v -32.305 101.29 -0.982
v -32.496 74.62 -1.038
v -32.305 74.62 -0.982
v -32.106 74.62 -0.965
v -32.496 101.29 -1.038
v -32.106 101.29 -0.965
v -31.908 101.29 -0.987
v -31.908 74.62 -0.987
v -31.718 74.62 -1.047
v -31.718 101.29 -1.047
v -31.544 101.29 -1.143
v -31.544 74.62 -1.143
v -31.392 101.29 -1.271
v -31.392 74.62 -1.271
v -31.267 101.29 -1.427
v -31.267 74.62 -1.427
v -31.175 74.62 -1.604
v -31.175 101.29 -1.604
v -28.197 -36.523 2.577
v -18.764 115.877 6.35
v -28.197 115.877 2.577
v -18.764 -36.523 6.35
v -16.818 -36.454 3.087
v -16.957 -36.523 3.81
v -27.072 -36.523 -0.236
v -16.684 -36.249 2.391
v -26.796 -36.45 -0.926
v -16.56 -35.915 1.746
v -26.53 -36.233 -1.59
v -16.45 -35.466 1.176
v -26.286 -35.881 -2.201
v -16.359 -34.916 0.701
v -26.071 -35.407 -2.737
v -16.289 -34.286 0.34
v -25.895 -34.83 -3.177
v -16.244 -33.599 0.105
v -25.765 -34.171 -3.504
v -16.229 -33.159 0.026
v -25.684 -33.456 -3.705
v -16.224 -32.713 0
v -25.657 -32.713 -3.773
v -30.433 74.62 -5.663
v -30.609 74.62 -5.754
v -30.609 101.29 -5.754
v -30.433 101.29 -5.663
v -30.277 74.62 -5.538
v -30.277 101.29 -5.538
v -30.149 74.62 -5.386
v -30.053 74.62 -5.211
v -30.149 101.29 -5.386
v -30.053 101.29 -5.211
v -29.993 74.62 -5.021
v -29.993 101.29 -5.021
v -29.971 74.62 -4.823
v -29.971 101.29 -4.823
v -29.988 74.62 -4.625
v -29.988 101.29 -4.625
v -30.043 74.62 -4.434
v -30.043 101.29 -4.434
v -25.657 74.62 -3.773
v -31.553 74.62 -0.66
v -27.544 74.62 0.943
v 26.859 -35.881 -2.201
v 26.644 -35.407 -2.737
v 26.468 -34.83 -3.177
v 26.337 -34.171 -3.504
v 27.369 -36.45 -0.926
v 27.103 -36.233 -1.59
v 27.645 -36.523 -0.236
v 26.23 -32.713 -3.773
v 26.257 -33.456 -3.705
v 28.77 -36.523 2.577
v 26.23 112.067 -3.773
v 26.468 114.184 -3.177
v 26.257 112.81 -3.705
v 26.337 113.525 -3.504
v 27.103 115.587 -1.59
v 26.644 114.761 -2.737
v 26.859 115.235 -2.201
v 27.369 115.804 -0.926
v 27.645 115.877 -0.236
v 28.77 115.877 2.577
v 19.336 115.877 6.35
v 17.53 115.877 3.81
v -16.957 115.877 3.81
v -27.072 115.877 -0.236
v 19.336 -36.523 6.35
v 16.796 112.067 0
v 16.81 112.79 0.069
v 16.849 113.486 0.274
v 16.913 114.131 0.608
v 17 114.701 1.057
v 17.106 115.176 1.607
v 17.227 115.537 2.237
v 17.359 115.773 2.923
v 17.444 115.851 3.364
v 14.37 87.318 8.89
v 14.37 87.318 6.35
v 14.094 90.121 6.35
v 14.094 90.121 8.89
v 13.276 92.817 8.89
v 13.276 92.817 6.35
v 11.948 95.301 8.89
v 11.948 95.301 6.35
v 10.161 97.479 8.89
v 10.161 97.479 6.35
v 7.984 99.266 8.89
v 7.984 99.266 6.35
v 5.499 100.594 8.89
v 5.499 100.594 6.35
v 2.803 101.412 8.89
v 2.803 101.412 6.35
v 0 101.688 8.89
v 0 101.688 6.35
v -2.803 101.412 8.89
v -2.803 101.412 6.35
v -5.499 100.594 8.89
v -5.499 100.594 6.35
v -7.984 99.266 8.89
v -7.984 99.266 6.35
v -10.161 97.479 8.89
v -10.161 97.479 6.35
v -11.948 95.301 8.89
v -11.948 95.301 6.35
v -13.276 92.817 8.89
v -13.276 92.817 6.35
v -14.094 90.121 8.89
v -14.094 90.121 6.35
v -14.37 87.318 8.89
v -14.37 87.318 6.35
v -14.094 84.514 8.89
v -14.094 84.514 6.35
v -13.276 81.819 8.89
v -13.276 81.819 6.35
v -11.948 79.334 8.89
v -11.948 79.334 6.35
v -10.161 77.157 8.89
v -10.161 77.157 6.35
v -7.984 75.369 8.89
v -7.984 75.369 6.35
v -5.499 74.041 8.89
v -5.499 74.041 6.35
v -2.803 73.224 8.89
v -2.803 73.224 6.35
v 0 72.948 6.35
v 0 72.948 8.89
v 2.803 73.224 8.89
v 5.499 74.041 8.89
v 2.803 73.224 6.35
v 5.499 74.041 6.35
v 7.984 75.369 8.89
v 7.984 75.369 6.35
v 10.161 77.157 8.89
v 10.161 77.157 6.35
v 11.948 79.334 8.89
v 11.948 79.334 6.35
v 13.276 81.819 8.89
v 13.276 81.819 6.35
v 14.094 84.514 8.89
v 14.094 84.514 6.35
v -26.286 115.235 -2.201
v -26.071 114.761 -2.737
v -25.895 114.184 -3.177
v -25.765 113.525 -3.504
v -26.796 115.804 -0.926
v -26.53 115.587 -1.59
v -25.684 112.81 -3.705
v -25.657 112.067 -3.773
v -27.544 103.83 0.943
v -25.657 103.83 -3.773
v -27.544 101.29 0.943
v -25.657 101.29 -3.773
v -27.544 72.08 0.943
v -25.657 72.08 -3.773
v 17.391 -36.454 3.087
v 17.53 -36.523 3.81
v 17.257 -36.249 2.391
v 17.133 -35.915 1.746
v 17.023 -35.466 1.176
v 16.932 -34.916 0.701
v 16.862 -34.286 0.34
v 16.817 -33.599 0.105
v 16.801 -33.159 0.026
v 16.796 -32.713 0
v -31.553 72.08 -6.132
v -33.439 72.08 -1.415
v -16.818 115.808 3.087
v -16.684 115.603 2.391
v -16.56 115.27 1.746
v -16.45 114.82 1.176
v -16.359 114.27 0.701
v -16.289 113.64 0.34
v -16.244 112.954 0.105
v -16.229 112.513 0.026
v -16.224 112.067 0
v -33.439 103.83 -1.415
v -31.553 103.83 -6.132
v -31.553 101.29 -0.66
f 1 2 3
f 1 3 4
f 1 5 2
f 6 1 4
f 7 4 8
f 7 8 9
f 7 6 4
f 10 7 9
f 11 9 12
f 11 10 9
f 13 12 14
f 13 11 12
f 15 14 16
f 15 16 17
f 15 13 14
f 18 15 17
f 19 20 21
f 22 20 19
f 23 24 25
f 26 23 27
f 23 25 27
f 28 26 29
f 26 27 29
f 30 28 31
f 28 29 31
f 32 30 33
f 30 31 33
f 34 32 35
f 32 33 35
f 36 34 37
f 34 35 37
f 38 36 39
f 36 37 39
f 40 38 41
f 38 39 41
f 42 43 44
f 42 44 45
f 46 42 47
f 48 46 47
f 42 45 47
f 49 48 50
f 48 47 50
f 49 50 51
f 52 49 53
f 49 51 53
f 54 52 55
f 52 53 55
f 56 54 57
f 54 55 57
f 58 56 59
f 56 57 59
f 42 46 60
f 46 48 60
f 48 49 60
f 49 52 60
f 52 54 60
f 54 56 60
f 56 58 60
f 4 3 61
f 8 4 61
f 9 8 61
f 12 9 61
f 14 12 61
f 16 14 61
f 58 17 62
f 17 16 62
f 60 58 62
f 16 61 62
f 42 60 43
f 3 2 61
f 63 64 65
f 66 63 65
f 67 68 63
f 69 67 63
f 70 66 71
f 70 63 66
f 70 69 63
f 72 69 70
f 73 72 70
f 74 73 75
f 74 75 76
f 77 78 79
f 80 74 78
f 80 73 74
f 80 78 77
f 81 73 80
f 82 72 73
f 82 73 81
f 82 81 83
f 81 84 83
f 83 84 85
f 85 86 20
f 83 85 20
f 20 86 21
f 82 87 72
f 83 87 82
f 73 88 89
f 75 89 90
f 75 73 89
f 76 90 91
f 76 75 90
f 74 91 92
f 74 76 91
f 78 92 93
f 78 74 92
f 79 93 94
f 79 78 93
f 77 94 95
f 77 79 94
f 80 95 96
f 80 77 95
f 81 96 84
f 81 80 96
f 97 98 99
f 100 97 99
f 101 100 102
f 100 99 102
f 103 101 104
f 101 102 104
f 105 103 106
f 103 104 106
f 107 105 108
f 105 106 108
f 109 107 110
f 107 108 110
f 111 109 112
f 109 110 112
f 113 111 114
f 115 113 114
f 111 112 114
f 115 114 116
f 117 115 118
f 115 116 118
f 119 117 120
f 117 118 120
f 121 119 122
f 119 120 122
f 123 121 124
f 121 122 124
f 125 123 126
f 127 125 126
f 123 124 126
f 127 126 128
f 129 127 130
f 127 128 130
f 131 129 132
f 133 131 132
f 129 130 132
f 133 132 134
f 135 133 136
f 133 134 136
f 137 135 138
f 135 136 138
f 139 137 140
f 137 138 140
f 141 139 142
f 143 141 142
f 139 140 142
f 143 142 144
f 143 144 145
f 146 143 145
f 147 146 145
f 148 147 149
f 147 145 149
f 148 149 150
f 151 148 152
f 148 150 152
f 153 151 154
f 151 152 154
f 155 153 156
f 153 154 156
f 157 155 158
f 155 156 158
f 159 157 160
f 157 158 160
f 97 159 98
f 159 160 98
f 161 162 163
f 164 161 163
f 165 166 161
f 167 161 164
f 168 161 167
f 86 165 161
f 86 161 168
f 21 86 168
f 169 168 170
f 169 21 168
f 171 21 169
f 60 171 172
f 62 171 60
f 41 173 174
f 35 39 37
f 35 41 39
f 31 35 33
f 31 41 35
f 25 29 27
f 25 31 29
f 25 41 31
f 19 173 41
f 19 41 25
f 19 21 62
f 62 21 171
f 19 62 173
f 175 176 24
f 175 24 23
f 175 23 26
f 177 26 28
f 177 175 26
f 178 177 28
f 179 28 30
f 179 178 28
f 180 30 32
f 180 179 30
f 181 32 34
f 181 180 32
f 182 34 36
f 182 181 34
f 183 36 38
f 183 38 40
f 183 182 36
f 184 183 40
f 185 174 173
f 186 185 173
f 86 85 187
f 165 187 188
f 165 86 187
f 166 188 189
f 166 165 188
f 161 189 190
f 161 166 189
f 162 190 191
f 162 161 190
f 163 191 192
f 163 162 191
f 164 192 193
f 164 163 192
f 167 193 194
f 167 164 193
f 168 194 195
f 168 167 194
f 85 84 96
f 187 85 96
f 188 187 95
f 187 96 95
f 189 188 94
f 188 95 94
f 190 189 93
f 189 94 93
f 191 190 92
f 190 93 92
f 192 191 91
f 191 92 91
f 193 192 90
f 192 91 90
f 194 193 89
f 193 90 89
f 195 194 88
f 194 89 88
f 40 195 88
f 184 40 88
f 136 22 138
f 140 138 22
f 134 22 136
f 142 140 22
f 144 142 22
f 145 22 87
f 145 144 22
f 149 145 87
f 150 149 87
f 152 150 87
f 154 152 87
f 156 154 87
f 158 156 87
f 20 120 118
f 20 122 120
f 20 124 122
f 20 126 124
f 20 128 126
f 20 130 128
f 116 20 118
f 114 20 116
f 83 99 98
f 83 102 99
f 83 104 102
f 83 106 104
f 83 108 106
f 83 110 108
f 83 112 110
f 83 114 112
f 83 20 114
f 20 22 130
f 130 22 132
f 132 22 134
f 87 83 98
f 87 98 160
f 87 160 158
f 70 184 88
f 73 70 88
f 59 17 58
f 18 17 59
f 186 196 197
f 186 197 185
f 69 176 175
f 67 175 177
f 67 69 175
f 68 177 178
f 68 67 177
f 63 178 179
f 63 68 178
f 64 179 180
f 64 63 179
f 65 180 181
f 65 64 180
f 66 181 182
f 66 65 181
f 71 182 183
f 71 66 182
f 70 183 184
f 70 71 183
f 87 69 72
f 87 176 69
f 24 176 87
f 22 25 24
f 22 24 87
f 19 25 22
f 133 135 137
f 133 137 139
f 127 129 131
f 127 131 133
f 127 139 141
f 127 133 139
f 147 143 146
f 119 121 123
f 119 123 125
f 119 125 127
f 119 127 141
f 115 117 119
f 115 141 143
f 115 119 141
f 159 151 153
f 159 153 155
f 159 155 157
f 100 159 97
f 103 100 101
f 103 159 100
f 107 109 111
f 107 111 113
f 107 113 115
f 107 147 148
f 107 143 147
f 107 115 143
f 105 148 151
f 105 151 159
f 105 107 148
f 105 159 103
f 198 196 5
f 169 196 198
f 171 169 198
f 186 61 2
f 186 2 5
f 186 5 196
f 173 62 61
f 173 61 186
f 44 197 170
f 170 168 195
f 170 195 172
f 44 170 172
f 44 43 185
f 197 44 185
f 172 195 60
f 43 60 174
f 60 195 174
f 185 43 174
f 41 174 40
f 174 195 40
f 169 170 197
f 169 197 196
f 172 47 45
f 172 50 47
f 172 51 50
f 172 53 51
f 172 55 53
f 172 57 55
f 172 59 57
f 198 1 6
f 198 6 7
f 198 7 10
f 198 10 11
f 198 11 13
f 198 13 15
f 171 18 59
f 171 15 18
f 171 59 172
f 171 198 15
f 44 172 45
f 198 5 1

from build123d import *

# Parameters (mm, degrees)
F0_W       = 38.1
F0_H       = 152.4
F1_DEPTH   = 6.35
F2_SIZE2   = 2.53999
F2_SIZE    = 6.34999
F2_2_SIZE2 = 2.53999
F2_2_SIZE  = 6.34999
F3_W       = 152.4
F3_H       = 6.8391593051
F4_DEPTH   = 10.16
F5_W       = 152.4
F5_H       = 6.8391593051
F6_DEPTH   = 10.16
F7_R       = 3.81
F8_W       = 31.75
F8_H       = 5.08
F9_DEPTH   = 6.35
F10_W      = 4.318
F10_H      = 26.67
F11_DEPTH  = 25.4
F12_R      = 1.016
F13_R      = 14.3701538506
F14_DEPTH  = 2.54


# Not quite as in the source:
# - a fillet or chamfer is up to 0.001 mm smaller than in the source, because OpenCascade refuses the exact size


with BuildPart() as f1:
    # F0 (on Top) → F1 (new body)
    with BuildSketch(Plane.XY):
        with Locations((0.2864310518, 39.6771576124)):
            Rectangle(F0_W, F0_H)
    extrude(amount=F1_DEPTH)

    # F2 (size 6.35 and 2.54 in the source; OpenCascade refuses exactly that, so slightly less here)
    f2_edges = [f1.edges().sort_by_distance(p)[0] for p in [
        (-18.763569, 39.677158, 0),
    ]]
    f2_side = f1.faces().sort_by_distance((-18.763569, 39.677158, 3.175))[0]
    chamfer(f2_edges, length=F2_SIZE, length2=F2_SIZE2, reference=f2_side)

    # F2#2 (size 6.35 and 2.54 in the source; OpenCascade refuses exactly that, so slightly less here)
    f2_2_edges = [f1.edges().sort_by_distance(p)[0] for p in [
        (19.336431, 39.677158, 0),
    ]]
    f2_2_side = f1.faces().sort_by_distance((19.336431, 39.677158, 3.175))[0]
    chamfer(f2_2_edges, length=F2_2_SIZE, length2=F2_2_SIZE2, reference=f2_2_side)

    # F3 (on face) → F4 (join)
    with BuildSketch(Plane(origin=(-13.9858353002, 0, -5.5943341201), x_dir=(0, -1, 0), z_dir=(-0.9284766909, 0, -0.3713906764))):
        with Locations((-39.6771576124, 9.4448618971)):
            Rectangle(F3_W, F3_H)
    extrude(amount=F4_DEPTH)

    # F5 (on face) → F6 (join)
    with BuildSketch(Plane(origin=(14.4796819412, 0, -5.7918727765), x_dir=(0, 1, 0), z_dir=(0.9284766909, 0, -0.3713906764))):
        with Locations((39.6771576124, 9.6576175412)):
            Rectangle(F5_W, F5_H)
    extrude(amount=F6_DEPTH)

    # F7
    f7_edges = [f1.edges().sort_by_distance(p)[0] for p in [
        (0.286431, -36.522842, 0),
        (-20.940231, -36.522842, -1.886665),
        (21.513093, -36.522842, -1.886665),
        (21.513093, 115.877158, -1.886665),
        (0.286431, 115.877158, 0),
        (-20.940231, 115.877158, -1.886665),
    ]]
    fillet(f7_edges, radius=F7_R)

    # F8 (on face) → F9 (join)
    with BuildSketch(Plane(origin=(-23.4191584796, 0, -9.3676633918), x_dir=(0, -1, 0), z_dir=(-0.9284766909, 0, -0.3713906764))):
        with Locations((-87.9551129937, 8.5652822446)):
            Rectangle(F8_W, F8_H)
    extrude(amount=F9_DEPTH)

    # F10 (on face) → F11 (cut)
    with BuildSketch(Plane(origin=(-4.1243982839, 0, 10.3109957098), x_dir=(0.9284766909, 0, 0.3713906764), z_dir=(-0.3713906764, 0, 0.9284766909))):
        with Locations((-27.3822056114, 87.9551129937)):
            Rectangle(F10_W, F10_H)
    extrude(amount=-F11_DEPTH, mode=Mode.SUBTRACT)

    # F12
    f12_edges = [f1.edges().sort_by_distance(p)[0] for p in [
        (-31.552719, 87.955113, -0.660333),
        (-29.666054, 87.955113, -5.376994),
    ]]
    fillet(f12_edges, radius=F12_R)

    # F13 (on face) → F14 (join)
    with BuildSketch(Plane.XY.offset(6.35)):
        with Locations((0, 87.3177349567)):
            Circle(F13_R)
    extrude(amount=F14_DEPTH)


solid = f1.part
